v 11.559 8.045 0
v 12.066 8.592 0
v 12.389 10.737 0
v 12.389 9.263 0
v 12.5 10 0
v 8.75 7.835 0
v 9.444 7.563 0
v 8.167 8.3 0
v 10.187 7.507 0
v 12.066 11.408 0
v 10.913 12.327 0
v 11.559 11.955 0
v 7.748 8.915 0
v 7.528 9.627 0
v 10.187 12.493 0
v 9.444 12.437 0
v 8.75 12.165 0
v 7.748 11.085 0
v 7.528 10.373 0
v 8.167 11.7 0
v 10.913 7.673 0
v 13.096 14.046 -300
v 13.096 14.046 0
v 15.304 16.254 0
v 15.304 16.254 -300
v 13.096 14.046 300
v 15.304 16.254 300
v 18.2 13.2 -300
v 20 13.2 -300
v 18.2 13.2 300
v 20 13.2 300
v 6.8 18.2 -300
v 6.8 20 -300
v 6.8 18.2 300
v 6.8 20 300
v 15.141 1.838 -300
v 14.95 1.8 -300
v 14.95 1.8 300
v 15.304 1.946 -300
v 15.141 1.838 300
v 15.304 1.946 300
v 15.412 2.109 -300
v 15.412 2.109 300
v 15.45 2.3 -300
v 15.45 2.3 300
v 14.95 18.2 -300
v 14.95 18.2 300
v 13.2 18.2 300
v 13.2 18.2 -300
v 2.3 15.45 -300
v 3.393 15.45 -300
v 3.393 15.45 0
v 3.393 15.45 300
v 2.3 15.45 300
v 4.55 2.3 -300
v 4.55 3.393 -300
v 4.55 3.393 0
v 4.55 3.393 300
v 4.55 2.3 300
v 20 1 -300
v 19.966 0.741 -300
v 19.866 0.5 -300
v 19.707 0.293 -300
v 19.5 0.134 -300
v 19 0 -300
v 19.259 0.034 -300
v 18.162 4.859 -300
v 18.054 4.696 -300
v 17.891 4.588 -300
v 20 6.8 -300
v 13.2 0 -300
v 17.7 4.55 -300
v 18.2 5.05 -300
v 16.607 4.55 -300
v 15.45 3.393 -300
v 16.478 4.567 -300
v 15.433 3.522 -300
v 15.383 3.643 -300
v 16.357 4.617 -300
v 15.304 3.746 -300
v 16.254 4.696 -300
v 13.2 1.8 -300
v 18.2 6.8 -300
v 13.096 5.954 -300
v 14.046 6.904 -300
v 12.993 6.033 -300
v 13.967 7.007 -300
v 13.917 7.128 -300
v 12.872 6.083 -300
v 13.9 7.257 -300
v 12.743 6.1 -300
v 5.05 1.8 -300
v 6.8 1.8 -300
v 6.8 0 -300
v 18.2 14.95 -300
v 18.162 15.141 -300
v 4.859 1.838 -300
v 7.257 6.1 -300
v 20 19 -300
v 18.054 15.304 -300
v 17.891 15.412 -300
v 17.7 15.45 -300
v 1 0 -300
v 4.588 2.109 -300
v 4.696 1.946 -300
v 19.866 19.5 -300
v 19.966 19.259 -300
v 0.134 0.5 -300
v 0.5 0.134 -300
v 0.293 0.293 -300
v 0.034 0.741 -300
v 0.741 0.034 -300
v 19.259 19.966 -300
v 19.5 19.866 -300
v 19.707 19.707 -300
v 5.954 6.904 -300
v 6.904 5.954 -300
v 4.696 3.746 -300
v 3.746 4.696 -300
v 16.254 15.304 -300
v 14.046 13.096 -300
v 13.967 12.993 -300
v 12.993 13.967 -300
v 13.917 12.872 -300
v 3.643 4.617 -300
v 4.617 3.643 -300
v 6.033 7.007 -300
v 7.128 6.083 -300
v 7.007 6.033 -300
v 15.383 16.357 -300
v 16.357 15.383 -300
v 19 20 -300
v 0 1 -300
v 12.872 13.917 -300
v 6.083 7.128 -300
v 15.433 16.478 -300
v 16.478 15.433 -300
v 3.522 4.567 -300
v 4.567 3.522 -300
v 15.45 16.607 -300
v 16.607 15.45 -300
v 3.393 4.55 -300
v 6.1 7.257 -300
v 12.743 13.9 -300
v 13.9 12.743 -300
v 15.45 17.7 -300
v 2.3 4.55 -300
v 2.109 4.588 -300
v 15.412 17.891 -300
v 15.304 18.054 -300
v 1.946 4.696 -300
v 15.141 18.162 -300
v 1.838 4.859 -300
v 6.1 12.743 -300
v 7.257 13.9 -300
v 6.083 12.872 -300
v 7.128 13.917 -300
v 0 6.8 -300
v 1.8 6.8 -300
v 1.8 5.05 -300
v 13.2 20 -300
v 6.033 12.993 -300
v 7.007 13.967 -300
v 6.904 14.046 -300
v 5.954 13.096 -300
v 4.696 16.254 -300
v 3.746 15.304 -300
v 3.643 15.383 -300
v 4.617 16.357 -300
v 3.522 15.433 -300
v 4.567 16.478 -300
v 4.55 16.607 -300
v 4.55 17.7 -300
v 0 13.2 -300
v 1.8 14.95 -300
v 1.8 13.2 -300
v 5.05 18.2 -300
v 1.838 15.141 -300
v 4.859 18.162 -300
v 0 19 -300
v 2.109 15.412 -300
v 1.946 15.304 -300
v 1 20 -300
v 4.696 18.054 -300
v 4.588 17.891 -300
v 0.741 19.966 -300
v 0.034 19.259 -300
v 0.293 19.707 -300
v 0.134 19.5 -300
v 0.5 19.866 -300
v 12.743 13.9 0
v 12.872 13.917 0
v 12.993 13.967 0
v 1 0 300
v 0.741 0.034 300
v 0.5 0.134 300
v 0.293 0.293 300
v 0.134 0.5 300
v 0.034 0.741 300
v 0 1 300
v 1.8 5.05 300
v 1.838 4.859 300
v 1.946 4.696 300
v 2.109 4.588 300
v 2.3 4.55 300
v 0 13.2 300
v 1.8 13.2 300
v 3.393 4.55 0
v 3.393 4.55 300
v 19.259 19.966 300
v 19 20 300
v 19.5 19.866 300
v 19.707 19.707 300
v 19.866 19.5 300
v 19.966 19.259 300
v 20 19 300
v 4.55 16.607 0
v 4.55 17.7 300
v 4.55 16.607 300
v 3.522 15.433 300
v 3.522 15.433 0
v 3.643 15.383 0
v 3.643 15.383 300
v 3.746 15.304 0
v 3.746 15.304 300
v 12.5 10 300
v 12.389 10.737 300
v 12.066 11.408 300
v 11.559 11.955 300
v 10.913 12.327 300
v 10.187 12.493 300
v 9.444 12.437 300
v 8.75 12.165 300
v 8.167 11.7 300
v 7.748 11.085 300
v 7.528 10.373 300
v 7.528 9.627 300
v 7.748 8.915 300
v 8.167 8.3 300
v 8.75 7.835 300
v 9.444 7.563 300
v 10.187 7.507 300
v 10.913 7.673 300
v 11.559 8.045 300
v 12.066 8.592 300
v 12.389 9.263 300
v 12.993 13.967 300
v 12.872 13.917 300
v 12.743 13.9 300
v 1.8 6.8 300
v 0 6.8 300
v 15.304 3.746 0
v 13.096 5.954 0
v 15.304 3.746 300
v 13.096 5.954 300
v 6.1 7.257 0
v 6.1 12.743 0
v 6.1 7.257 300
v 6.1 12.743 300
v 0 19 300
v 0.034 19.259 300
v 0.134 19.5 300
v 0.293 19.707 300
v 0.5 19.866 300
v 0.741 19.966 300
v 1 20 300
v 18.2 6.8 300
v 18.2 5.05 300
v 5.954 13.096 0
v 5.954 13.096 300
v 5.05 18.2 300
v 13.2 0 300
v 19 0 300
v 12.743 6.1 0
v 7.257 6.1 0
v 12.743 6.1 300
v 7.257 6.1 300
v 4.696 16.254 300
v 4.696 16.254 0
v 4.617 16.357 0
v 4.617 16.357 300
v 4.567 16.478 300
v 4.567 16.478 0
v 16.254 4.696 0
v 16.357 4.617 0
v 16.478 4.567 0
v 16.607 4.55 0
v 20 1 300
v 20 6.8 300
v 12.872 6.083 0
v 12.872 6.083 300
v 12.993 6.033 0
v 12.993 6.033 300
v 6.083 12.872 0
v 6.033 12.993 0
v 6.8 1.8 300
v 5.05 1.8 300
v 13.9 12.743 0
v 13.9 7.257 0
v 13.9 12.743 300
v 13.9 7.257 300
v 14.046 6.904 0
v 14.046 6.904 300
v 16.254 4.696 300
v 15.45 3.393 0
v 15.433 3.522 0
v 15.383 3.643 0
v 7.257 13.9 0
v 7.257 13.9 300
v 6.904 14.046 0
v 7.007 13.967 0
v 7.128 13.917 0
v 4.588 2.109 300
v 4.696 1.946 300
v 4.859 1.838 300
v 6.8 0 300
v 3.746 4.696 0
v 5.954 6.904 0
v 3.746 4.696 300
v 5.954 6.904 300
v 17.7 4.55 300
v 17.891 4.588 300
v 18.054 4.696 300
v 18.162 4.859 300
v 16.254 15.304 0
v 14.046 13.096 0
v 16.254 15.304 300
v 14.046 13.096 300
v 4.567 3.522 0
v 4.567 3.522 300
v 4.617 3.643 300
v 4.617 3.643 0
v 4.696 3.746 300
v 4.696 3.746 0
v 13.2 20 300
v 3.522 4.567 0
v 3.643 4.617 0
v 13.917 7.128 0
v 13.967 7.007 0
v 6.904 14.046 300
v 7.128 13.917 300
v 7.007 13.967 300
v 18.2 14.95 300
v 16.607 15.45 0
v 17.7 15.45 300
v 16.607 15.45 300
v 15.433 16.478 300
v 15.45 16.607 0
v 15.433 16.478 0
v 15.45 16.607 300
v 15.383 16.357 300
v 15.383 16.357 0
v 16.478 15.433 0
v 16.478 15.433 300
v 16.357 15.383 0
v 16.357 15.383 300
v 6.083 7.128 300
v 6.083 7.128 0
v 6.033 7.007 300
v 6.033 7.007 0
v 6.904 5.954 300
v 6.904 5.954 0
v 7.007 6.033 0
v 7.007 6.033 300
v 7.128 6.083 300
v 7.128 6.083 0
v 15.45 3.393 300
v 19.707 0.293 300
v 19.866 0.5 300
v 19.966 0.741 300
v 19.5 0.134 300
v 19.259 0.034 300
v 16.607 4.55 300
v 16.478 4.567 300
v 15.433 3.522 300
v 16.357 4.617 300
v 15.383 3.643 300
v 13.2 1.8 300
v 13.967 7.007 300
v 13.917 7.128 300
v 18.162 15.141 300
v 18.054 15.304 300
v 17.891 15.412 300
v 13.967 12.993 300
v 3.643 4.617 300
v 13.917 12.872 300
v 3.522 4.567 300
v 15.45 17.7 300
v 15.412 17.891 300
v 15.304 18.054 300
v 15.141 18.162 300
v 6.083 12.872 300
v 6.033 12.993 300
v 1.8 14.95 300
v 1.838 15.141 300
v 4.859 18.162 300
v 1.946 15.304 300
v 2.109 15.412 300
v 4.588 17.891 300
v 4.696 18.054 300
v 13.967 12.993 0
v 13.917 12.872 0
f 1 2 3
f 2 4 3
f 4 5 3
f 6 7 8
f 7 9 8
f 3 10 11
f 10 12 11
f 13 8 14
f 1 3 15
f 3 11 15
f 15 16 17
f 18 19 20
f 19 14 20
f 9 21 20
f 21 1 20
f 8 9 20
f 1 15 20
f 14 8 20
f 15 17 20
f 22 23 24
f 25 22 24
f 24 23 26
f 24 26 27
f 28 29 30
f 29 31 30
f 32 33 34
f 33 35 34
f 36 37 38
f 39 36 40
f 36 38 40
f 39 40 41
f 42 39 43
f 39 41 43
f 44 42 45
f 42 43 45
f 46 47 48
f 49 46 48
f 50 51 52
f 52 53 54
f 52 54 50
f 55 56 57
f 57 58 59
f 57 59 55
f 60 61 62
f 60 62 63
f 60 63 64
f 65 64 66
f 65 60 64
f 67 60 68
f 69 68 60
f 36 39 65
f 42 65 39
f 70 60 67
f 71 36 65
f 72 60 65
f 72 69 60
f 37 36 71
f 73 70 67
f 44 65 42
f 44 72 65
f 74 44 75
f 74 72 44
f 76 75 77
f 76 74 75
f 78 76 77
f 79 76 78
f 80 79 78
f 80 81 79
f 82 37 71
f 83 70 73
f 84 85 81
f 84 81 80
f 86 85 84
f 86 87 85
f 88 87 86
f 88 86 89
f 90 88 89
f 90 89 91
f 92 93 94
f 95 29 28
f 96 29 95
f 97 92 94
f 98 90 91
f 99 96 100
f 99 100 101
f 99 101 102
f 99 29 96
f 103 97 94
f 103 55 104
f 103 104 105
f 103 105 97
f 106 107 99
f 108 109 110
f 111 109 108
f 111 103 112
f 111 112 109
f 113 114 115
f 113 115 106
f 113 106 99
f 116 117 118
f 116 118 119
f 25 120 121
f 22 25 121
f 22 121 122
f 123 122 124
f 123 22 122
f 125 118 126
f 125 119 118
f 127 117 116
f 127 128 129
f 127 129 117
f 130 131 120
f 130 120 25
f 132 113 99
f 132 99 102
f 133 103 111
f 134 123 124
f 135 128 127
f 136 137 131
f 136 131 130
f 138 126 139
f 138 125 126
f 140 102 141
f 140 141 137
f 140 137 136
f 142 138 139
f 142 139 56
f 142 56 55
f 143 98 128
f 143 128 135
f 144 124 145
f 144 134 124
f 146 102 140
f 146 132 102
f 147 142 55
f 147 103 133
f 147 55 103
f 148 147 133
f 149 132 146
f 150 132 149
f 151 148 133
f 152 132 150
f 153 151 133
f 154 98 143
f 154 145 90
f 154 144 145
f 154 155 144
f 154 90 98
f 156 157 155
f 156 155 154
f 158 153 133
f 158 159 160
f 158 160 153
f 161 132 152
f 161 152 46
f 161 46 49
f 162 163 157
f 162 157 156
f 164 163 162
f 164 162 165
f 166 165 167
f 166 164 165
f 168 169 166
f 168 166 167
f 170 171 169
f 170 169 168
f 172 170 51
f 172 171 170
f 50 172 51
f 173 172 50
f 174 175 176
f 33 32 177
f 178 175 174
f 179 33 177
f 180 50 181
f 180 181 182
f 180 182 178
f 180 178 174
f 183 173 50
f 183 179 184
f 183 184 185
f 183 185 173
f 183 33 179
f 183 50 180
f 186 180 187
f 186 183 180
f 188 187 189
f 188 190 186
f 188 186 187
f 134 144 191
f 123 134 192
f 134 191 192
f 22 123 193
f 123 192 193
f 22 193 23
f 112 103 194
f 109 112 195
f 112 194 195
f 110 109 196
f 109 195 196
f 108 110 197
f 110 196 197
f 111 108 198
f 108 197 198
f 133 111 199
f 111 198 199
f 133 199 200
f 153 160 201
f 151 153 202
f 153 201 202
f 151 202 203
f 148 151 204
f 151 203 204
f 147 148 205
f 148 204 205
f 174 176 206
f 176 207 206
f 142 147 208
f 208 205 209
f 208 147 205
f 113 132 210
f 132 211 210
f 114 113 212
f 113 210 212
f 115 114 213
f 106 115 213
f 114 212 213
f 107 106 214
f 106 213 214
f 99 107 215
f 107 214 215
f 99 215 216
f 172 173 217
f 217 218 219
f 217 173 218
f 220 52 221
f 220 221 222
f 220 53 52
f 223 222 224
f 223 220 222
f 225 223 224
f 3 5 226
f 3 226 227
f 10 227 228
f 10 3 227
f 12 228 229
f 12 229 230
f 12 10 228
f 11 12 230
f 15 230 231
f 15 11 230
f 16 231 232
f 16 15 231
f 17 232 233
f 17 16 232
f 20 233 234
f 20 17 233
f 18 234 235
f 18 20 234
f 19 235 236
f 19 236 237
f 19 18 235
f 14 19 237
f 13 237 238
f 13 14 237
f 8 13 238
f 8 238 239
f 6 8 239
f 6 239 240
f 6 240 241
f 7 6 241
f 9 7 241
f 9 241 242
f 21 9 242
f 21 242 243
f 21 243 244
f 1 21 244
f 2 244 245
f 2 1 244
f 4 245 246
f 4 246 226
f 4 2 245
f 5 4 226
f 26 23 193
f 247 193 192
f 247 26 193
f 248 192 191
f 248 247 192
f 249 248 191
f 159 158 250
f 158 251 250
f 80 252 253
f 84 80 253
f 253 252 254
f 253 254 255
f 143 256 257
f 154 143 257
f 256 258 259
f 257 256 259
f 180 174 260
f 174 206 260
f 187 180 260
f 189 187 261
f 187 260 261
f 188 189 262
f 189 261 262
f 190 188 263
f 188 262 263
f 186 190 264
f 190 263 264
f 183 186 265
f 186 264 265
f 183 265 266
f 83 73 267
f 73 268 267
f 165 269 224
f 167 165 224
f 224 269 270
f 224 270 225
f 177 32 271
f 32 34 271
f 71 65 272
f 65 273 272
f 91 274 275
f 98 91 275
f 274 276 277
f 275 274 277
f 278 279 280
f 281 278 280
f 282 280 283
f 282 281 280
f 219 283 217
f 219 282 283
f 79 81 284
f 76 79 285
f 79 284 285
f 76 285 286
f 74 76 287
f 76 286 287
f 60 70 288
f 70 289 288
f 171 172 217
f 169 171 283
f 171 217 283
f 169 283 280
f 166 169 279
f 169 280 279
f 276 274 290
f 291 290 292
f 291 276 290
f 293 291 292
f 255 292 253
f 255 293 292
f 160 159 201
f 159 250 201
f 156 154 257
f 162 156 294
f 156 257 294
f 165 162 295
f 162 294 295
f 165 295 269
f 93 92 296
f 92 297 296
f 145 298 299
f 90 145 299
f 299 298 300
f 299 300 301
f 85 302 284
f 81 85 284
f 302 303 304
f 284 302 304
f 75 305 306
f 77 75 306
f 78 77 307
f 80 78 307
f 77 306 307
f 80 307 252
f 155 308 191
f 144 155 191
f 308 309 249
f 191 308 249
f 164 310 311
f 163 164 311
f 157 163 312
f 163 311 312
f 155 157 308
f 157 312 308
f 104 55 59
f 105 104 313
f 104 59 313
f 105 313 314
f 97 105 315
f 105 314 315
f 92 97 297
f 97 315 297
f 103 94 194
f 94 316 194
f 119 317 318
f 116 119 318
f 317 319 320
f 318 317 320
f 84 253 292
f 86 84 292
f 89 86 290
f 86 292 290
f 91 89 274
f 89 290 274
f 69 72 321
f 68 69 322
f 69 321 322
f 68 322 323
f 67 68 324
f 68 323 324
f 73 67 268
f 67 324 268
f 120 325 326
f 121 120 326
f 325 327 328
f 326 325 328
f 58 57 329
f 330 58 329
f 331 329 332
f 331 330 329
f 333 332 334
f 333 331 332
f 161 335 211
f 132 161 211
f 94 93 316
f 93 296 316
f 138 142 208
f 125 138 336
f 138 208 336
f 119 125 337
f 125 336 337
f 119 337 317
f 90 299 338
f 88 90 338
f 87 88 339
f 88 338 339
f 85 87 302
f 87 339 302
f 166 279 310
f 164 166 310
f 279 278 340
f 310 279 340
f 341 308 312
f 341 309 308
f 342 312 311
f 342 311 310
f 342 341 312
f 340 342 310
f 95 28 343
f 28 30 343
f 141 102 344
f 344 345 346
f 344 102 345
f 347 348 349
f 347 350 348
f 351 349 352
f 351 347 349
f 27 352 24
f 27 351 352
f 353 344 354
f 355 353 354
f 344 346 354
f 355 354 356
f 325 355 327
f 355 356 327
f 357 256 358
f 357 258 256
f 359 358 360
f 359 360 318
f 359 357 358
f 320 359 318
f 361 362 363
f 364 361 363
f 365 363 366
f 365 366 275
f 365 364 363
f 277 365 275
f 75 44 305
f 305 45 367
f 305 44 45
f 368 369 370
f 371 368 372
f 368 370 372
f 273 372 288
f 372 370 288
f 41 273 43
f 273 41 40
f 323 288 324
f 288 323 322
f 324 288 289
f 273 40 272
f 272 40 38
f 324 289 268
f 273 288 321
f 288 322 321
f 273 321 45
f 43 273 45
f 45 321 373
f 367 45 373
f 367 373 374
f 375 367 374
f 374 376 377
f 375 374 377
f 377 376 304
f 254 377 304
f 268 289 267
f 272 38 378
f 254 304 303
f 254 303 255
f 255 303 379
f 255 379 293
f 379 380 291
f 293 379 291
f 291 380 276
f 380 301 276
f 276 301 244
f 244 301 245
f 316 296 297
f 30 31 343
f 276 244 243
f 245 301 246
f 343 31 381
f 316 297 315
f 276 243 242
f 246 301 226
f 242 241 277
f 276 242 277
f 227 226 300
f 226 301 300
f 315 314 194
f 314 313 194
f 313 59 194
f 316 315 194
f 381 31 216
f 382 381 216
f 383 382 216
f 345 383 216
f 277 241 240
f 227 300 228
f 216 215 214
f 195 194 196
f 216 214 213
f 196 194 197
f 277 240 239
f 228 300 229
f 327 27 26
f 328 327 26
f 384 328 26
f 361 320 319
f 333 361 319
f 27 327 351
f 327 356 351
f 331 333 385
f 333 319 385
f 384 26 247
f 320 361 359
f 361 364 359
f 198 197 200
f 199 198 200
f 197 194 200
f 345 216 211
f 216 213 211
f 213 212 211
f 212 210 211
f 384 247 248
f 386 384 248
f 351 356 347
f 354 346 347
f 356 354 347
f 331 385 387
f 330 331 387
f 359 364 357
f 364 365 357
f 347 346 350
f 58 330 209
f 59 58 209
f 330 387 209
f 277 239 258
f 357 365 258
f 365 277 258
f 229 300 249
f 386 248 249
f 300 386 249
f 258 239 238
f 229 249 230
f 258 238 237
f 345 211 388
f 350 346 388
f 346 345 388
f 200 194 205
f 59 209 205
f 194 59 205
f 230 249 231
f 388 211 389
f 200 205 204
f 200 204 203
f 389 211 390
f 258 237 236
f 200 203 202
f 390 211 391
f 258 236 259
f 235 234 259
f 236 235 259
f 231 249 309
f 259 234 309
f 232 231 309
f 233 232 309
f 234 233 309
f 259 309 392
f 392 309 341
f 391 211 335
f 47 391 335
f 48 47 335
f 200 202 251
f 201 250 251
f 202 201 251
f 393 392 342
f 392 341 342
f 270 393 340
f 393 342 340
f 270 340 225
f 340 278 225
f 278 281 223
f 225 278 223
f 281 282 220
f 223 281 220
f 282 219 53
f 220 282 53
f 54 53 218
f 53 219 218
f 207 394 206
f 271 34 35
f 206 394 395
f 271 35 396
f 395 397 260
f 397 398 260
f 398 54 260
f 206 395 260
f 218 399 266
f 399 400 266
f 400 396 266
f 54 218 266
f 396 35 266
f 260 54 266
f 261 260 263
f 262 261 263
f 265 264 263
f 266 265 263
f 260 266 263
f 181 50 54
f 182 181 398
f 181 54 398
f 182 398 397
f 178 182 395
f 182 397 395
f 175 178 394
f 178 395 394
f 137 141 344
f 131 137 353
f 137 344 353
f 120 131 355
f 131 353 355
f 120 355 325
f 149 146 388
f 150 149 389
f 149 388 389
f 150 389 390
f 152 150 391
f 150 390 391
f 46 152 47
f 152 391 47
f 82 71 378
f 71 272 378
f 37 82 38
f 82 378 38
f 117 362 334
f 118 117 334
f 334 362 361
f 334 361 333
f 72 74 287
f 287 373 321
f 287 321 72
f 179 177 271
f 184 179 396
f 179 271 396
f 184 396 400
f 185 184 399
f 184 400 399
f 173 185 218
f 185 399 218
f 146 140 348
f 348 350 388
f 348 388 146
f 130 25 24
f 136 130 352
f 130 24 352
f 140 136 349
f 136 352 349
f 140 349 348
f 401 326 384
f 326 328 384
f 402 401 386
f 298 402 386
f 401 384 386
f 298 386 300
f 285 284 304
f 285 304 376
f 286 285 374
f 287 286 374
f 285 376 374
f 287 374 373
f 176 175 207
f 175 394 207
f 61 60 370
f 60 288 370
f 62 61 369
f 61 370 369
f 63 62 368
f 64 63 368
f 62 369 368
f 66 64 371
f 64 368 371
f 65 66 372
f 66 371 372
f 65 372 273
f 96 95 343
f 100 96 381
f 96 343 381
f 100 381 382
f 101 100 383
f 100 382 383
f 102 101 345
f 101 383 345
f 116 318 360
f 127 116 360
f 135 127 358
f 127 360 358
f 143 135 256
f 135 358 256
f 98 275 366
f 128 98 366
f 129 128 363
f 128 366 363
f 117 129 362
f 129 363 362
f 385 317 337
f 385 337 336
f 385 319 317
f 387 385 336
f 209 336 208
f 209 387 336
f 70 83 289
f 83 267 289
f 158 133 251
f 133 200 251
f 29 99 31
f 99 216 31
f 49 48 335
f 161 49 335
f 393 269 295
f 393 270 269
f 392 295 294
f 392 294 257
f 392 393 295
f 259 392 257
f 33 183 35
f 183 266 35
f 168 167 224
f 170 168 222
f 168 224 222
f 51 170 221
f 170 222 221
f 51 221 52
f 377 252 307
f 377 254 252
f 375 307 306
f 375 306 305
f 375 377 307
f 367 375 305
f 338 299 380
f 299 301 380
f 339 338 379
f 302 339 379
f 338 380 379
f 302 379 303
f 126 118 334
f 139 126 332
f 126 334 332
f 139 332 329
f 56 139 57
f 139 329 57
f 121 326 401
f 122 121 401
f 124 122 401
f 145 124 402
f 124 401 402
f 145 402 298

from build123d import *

# Parameters (mm, degrees)
SKETCH1_R           = 2.5
BOSS_EXTRUDE1_DEPTH = 300
FILLET1_R           = 1
FILLET2_R           = 0.5
FILLET3_R           = 0.5
FILLET4_R           = 0.5
FILLET5_R           = 0.5
BOSS_EXTRUDE2_DEPTH = 300


with BuildPart() as part:
    # Sketch1 → Boss-Extrude1 (new body)
    with BuildSketch(Plane.XY):
        Polygon((13.2, 0), (13.2, 1.8), (15.45, 1.8), (15.45, 3.6), (12.95, 6.1), (7.05, 6.1), (4.55, 3.6), (4.55, 1.8), (6.8, 1.8), (6.8, 0), (0, 0), (0, 6.8), (1.8, 6.8), (1.8, 4.55), (3.6, 4.55), (6.1, 7.05), (6.1, 12.95), (3.6, 15.45), (1.8, 15.45), (1.8, 13.2), (0, 13.2), (0, 20), (6.8, 20), (6.8, 18.2), (4.55, 18.2), (4.55, 16.4), (7.05, 13.9), (12.95, 13.9), (15.45, 16.4), (15.45, 18.2), (13.2, 18.2), (13.2, 20), (20, 20), (20, 13.2), (18.2, 13.2), (18.2, 15.45), (16.4, 15.45), (13.9, 12.95), (13.9, 7.05), (16.4, 4.55), (18.2, 4.55), (18.2, 6.8), (20, 6.8), (20, 0), align=None)
        with Locations((10, 10)):
            Circle(SKETCH1_R, mode=Mode.SUBTRACT)
    extrude(amount=BOSS_EXTRUDE1_DEPTH)

    # Fillet1
    fillet1_edges = [part.edges().sort_by_distance(p)[0] for p in [
        (0, 0, 150),
        (0, 20, 150),
        (20, 20, 150),
        (20, 0, 150),
    ]]
    fillet(fillet1_edges, radius=FILLET1_R)

    # Fillet2
    fillet2_edges = [part.edges().sort_by_distance(p)[0] for p in [
        (4.55, 18.2, 150),
        (4.55, 16.4, 150),
        (7.05, 13.9, 150),
        (12.95, 13.9, 150),
        (15.45, 16.4, 150),
        (15.45, 18.2, 150),
    ]]
    fillet(fillet2_edges, radius=FILLET2_R)

    # Fillet3
    fillet3_edges = [part.edges().sort_by_distance(p)[0] for p in [
        (18.2, 15.45, 150),
        (16.4, 15.45, 150),
        (13.9, 12.95, 150),
        (13.9, 7.05, 150),
        (16.4, 4.55, 150),
        (18.2, 4.55, 150),
    ]]
    fillet(fillet3_edges, radius=FILLET3_R)

    # Fillet4
    fillet4_edges = [part.edges().sort_by_distance(p)[0] for p in [
        (1.8, 4.55, 150),
        (3.6, 4.55, 150),
        (6.1, 7.05, 150),
        (6.1, 12.95, 150),
        (3.6, 15.45, 150),
        (1.8, 15.45, 150),
    ]]
    fillet(fillet4_edges, radius=FILLET4_R)

    # Fillet5
    fillet5_edges = [part.edges().sort_by_distance(p)[0] for p in [
        (15.45, 1.8, 150),
        (15.45, 3.6, 150),
        (12.95, 6.1, 150),
        (7.05, 6.1, 150),
        (4.55, 3.6, 150),
        (4.55, 1.8, 150),
    ]]
    fillet(fillet5_edges, radius=FILLET5_R)

    # Sketch4 → Boss-Extrude2 (add)
    with BuildSketch(Plane(origin=(0, 0, 0), x_dir=(-1, 0, 0), z_dir=(0, 0, -1))):
        with BuildLine():
            Line((-13.2, 20), (-19, 20))
            ThreePointArc((-19, 20), (-19.707106781, 19.707106781), (-20, 19))
            Line((-20, 19), (-20, 13.2))
            Line((-20, 13.2), (-18.2, 13.2))
            Line((-18.2, 13.2), (-18.2, 14.95))
            ThreePointArc((-18.2, 14.95), (-18.053553391, 15.303553391), (-17.7, 15.45))
            Line((-17.7, 15.45), (-16.607106781, 15.45))
            ThreePointArc((-16.607106781, 15.45), (-16.415765065, 15.411939766), (-16.253553391, 15.303553391))
            Line((-16.253553391, 15.303553391), (-14.046446609, 13.096446609))
            ThreePointArc((-14.046446609, 13.096446609), (-13.938060234, 12.934234935), (-13.9, 12.742893219))
            Line((-13.9, 12.742893219), (-13.9, 7.257106781))
            ThreePointArc((-13.9, 7.257106781), (-13.938060234, 7.065765065), (-14.046446609, 6.903553391))
            Line((-14.046446609, 6.903553391), (-16.253553391, 4.696446609))
            ThreePointArc((-16.253553391, 4.696446609), (-16.415765065, 4.588060234), (-16.607106781, 4.55))
            Line((-16.607106781, 4.55), (-17.7, 4.55))
            ThreePointArc((-17.7, 4.55), (-18.053553391, 4.696446609), (-18.2, 5.05))
            Line((-18.2, 5.05), (-18.2, 6.8))
            Line((-18.2, 6.8), (-20, 6.8))
            Line((-20, 6.8), (-20, 1))
            ThreePointArc((-20, 1), (-19.707106781, 0.292893219), (-19, 0))
            Line((-19, 0), (-13.2, 0))
            Line((-13.2, 0), (-13.2, 1.8))
            Line((-13.2, 1.8), (-14.95, 1.8))
            ThreePointArc((-14.95, 1.8), (-15.303553391, 1.946446609), (-15.45, 2.3))
            Line((-15.45, 2.3), (-15.45, 3.392893219))
            ThreePointArc((-15.45, 3.392893219), (-15.411939766, 3.584234935), (-15.303553391, 3.746446609))
            Line((-15.303553391, 3.746446609), (-13.096446609, 5.953553391))
            ThreePointArc((-13.096446609, 5.953553391), (-12.934234935, 6.061939766), (-12.742893219, 6.1))
            Line((-12.742893219, 6.1), (-7.257106781, 6.1))
            ThreePointArc((-7.257106781, 6.1), (-7.065765065, 6.061939766), (-6.903553391, 5.953553391))
            Line((-6.903553391, 5.953553391), (-4.696446609, 3.746446609))
            ThreePointArc((-4.696446609, 3.746446609), (-4.588060234, 3.584234935), (-4.55, 3.392893219))
            Line((-4.55, 3.392893219), (-4.55, 2.3))
            ThreePointArc((-4.55, 2.3), (-4.696446609, 1.946446609), (-5.05, 1.8))
            Line((-5.05, 1.8), (-6.8, 1.8))
            Line((-6.8, 1.8), (-6.8, 0))
            Line((-6.8, 0), (-1, 0))
            ThreePointArc((-1, 0), (-0.292893219, 0.292893219), (0, 1))
            Line((0, 1), (0, 6.8))
            Line((0, 6.8), (-1.8, 6.8))
            Line((-1.8, 6.8), (-1.8, 5.05))
            ThreePointArc((-1.8, 5.05), (-1.946446609, 4.696446609), (-2.3, 4.55))
            Line((-2.3, 4.55), (-3.392893219, 4.55))
            ThreePointArc((-3.392893219, 4.55), (-3.584234935, 4.588060234), (-3.746446609, 4.696446609))
            Line((-3.746446609, 4.696446609), (-5.953553391, 6.903553391))
            ThreePointArc((-5.953553391, 6.903553391), (-6.061939766, 7.065765065), (-6.1, 7.257106781))
            Line((-6.1, 7.257106781), (-6.1, 12.742893219))
            ThreePointArc((-6.1, 12.742893219), (-6.061939766, 12.934234935), (-5.953553391, 13.096446609))
            Line((-5.953553391, 13.096446609), (-3.746446609, 15.303553391))
            ThreePointArc((-3.746446609, 15.303553391), (-3.584234935, 15.411939766), (-3.392893219, 15.45))
            Line((-3.392893219, 15.45), (-2.3, 15.45))
            ThreePointArc((-2.3, 15.45), (-1.946446609, 15.303553391), (-1.8, 14.95))
            Line((-1.8, 14.95), (-1.8, 13.2))
            Line((-1.8, 13.2), (0, 13.2))
            Line((0, 13.2), (0, 19))
            ThreePointArc((0, 19), (-0.292893219, 19.707106781), (-1, 20))
            Line((-1, 20), (-6.8, 20))
            Line((-6.8, 20), (-6.8, 18.2))
            Line((-6.8, 18.2), (-5.05, 18.2))
            ThreePointArc((-5.05, 18.2), (-4.696446609, 18.053553391), (-4.55, 17.7))
            Line((-4.55, 17.7), (-4.55, 16.607106781))
            ThreePointArc((-4.55, 16.607106781), (-4.588060234, 16.415765065), (-4.696446609, 16.253553391))
            Line((-4.696446609, 16.253553391), (-6.903553391, 14.046446609))
            ThreePointArc((-6.903553391, 14.046446609), (-7.065765065, 13.938060234), (-7.257106781, 13.9))
            Line((-7.257106781, 13.9), (-12.742893219, 13.9))
            ThreePointArc((-12.742893219, 13.9), (-12.934234935, 13.938060234), (-13.096446609, 14.046446609))
            Line((-13.096446609, 14.046446609), (-15.303553391, 16.253553391))
            ThreePointArc((-15.303553391, 16.253553391), (-15.411939766, 16.415765065), (-15.45, 16.607106781))
            Line((-15.45, 16.607106781), (-15.45, 17.7))
            ThreePointArc((-15.45, 17.7), (-15.303553391, 18.053553391), (-14.95, 18.2))
            Line((-14.95, 18.2), (-13.2, 18.2))
            Line((-13.2, 18.2), (-13.2, 20))
        make_face()
    extrude(amount=BOSS_EXTRUDE2_DEPTH)


solid = part.part
